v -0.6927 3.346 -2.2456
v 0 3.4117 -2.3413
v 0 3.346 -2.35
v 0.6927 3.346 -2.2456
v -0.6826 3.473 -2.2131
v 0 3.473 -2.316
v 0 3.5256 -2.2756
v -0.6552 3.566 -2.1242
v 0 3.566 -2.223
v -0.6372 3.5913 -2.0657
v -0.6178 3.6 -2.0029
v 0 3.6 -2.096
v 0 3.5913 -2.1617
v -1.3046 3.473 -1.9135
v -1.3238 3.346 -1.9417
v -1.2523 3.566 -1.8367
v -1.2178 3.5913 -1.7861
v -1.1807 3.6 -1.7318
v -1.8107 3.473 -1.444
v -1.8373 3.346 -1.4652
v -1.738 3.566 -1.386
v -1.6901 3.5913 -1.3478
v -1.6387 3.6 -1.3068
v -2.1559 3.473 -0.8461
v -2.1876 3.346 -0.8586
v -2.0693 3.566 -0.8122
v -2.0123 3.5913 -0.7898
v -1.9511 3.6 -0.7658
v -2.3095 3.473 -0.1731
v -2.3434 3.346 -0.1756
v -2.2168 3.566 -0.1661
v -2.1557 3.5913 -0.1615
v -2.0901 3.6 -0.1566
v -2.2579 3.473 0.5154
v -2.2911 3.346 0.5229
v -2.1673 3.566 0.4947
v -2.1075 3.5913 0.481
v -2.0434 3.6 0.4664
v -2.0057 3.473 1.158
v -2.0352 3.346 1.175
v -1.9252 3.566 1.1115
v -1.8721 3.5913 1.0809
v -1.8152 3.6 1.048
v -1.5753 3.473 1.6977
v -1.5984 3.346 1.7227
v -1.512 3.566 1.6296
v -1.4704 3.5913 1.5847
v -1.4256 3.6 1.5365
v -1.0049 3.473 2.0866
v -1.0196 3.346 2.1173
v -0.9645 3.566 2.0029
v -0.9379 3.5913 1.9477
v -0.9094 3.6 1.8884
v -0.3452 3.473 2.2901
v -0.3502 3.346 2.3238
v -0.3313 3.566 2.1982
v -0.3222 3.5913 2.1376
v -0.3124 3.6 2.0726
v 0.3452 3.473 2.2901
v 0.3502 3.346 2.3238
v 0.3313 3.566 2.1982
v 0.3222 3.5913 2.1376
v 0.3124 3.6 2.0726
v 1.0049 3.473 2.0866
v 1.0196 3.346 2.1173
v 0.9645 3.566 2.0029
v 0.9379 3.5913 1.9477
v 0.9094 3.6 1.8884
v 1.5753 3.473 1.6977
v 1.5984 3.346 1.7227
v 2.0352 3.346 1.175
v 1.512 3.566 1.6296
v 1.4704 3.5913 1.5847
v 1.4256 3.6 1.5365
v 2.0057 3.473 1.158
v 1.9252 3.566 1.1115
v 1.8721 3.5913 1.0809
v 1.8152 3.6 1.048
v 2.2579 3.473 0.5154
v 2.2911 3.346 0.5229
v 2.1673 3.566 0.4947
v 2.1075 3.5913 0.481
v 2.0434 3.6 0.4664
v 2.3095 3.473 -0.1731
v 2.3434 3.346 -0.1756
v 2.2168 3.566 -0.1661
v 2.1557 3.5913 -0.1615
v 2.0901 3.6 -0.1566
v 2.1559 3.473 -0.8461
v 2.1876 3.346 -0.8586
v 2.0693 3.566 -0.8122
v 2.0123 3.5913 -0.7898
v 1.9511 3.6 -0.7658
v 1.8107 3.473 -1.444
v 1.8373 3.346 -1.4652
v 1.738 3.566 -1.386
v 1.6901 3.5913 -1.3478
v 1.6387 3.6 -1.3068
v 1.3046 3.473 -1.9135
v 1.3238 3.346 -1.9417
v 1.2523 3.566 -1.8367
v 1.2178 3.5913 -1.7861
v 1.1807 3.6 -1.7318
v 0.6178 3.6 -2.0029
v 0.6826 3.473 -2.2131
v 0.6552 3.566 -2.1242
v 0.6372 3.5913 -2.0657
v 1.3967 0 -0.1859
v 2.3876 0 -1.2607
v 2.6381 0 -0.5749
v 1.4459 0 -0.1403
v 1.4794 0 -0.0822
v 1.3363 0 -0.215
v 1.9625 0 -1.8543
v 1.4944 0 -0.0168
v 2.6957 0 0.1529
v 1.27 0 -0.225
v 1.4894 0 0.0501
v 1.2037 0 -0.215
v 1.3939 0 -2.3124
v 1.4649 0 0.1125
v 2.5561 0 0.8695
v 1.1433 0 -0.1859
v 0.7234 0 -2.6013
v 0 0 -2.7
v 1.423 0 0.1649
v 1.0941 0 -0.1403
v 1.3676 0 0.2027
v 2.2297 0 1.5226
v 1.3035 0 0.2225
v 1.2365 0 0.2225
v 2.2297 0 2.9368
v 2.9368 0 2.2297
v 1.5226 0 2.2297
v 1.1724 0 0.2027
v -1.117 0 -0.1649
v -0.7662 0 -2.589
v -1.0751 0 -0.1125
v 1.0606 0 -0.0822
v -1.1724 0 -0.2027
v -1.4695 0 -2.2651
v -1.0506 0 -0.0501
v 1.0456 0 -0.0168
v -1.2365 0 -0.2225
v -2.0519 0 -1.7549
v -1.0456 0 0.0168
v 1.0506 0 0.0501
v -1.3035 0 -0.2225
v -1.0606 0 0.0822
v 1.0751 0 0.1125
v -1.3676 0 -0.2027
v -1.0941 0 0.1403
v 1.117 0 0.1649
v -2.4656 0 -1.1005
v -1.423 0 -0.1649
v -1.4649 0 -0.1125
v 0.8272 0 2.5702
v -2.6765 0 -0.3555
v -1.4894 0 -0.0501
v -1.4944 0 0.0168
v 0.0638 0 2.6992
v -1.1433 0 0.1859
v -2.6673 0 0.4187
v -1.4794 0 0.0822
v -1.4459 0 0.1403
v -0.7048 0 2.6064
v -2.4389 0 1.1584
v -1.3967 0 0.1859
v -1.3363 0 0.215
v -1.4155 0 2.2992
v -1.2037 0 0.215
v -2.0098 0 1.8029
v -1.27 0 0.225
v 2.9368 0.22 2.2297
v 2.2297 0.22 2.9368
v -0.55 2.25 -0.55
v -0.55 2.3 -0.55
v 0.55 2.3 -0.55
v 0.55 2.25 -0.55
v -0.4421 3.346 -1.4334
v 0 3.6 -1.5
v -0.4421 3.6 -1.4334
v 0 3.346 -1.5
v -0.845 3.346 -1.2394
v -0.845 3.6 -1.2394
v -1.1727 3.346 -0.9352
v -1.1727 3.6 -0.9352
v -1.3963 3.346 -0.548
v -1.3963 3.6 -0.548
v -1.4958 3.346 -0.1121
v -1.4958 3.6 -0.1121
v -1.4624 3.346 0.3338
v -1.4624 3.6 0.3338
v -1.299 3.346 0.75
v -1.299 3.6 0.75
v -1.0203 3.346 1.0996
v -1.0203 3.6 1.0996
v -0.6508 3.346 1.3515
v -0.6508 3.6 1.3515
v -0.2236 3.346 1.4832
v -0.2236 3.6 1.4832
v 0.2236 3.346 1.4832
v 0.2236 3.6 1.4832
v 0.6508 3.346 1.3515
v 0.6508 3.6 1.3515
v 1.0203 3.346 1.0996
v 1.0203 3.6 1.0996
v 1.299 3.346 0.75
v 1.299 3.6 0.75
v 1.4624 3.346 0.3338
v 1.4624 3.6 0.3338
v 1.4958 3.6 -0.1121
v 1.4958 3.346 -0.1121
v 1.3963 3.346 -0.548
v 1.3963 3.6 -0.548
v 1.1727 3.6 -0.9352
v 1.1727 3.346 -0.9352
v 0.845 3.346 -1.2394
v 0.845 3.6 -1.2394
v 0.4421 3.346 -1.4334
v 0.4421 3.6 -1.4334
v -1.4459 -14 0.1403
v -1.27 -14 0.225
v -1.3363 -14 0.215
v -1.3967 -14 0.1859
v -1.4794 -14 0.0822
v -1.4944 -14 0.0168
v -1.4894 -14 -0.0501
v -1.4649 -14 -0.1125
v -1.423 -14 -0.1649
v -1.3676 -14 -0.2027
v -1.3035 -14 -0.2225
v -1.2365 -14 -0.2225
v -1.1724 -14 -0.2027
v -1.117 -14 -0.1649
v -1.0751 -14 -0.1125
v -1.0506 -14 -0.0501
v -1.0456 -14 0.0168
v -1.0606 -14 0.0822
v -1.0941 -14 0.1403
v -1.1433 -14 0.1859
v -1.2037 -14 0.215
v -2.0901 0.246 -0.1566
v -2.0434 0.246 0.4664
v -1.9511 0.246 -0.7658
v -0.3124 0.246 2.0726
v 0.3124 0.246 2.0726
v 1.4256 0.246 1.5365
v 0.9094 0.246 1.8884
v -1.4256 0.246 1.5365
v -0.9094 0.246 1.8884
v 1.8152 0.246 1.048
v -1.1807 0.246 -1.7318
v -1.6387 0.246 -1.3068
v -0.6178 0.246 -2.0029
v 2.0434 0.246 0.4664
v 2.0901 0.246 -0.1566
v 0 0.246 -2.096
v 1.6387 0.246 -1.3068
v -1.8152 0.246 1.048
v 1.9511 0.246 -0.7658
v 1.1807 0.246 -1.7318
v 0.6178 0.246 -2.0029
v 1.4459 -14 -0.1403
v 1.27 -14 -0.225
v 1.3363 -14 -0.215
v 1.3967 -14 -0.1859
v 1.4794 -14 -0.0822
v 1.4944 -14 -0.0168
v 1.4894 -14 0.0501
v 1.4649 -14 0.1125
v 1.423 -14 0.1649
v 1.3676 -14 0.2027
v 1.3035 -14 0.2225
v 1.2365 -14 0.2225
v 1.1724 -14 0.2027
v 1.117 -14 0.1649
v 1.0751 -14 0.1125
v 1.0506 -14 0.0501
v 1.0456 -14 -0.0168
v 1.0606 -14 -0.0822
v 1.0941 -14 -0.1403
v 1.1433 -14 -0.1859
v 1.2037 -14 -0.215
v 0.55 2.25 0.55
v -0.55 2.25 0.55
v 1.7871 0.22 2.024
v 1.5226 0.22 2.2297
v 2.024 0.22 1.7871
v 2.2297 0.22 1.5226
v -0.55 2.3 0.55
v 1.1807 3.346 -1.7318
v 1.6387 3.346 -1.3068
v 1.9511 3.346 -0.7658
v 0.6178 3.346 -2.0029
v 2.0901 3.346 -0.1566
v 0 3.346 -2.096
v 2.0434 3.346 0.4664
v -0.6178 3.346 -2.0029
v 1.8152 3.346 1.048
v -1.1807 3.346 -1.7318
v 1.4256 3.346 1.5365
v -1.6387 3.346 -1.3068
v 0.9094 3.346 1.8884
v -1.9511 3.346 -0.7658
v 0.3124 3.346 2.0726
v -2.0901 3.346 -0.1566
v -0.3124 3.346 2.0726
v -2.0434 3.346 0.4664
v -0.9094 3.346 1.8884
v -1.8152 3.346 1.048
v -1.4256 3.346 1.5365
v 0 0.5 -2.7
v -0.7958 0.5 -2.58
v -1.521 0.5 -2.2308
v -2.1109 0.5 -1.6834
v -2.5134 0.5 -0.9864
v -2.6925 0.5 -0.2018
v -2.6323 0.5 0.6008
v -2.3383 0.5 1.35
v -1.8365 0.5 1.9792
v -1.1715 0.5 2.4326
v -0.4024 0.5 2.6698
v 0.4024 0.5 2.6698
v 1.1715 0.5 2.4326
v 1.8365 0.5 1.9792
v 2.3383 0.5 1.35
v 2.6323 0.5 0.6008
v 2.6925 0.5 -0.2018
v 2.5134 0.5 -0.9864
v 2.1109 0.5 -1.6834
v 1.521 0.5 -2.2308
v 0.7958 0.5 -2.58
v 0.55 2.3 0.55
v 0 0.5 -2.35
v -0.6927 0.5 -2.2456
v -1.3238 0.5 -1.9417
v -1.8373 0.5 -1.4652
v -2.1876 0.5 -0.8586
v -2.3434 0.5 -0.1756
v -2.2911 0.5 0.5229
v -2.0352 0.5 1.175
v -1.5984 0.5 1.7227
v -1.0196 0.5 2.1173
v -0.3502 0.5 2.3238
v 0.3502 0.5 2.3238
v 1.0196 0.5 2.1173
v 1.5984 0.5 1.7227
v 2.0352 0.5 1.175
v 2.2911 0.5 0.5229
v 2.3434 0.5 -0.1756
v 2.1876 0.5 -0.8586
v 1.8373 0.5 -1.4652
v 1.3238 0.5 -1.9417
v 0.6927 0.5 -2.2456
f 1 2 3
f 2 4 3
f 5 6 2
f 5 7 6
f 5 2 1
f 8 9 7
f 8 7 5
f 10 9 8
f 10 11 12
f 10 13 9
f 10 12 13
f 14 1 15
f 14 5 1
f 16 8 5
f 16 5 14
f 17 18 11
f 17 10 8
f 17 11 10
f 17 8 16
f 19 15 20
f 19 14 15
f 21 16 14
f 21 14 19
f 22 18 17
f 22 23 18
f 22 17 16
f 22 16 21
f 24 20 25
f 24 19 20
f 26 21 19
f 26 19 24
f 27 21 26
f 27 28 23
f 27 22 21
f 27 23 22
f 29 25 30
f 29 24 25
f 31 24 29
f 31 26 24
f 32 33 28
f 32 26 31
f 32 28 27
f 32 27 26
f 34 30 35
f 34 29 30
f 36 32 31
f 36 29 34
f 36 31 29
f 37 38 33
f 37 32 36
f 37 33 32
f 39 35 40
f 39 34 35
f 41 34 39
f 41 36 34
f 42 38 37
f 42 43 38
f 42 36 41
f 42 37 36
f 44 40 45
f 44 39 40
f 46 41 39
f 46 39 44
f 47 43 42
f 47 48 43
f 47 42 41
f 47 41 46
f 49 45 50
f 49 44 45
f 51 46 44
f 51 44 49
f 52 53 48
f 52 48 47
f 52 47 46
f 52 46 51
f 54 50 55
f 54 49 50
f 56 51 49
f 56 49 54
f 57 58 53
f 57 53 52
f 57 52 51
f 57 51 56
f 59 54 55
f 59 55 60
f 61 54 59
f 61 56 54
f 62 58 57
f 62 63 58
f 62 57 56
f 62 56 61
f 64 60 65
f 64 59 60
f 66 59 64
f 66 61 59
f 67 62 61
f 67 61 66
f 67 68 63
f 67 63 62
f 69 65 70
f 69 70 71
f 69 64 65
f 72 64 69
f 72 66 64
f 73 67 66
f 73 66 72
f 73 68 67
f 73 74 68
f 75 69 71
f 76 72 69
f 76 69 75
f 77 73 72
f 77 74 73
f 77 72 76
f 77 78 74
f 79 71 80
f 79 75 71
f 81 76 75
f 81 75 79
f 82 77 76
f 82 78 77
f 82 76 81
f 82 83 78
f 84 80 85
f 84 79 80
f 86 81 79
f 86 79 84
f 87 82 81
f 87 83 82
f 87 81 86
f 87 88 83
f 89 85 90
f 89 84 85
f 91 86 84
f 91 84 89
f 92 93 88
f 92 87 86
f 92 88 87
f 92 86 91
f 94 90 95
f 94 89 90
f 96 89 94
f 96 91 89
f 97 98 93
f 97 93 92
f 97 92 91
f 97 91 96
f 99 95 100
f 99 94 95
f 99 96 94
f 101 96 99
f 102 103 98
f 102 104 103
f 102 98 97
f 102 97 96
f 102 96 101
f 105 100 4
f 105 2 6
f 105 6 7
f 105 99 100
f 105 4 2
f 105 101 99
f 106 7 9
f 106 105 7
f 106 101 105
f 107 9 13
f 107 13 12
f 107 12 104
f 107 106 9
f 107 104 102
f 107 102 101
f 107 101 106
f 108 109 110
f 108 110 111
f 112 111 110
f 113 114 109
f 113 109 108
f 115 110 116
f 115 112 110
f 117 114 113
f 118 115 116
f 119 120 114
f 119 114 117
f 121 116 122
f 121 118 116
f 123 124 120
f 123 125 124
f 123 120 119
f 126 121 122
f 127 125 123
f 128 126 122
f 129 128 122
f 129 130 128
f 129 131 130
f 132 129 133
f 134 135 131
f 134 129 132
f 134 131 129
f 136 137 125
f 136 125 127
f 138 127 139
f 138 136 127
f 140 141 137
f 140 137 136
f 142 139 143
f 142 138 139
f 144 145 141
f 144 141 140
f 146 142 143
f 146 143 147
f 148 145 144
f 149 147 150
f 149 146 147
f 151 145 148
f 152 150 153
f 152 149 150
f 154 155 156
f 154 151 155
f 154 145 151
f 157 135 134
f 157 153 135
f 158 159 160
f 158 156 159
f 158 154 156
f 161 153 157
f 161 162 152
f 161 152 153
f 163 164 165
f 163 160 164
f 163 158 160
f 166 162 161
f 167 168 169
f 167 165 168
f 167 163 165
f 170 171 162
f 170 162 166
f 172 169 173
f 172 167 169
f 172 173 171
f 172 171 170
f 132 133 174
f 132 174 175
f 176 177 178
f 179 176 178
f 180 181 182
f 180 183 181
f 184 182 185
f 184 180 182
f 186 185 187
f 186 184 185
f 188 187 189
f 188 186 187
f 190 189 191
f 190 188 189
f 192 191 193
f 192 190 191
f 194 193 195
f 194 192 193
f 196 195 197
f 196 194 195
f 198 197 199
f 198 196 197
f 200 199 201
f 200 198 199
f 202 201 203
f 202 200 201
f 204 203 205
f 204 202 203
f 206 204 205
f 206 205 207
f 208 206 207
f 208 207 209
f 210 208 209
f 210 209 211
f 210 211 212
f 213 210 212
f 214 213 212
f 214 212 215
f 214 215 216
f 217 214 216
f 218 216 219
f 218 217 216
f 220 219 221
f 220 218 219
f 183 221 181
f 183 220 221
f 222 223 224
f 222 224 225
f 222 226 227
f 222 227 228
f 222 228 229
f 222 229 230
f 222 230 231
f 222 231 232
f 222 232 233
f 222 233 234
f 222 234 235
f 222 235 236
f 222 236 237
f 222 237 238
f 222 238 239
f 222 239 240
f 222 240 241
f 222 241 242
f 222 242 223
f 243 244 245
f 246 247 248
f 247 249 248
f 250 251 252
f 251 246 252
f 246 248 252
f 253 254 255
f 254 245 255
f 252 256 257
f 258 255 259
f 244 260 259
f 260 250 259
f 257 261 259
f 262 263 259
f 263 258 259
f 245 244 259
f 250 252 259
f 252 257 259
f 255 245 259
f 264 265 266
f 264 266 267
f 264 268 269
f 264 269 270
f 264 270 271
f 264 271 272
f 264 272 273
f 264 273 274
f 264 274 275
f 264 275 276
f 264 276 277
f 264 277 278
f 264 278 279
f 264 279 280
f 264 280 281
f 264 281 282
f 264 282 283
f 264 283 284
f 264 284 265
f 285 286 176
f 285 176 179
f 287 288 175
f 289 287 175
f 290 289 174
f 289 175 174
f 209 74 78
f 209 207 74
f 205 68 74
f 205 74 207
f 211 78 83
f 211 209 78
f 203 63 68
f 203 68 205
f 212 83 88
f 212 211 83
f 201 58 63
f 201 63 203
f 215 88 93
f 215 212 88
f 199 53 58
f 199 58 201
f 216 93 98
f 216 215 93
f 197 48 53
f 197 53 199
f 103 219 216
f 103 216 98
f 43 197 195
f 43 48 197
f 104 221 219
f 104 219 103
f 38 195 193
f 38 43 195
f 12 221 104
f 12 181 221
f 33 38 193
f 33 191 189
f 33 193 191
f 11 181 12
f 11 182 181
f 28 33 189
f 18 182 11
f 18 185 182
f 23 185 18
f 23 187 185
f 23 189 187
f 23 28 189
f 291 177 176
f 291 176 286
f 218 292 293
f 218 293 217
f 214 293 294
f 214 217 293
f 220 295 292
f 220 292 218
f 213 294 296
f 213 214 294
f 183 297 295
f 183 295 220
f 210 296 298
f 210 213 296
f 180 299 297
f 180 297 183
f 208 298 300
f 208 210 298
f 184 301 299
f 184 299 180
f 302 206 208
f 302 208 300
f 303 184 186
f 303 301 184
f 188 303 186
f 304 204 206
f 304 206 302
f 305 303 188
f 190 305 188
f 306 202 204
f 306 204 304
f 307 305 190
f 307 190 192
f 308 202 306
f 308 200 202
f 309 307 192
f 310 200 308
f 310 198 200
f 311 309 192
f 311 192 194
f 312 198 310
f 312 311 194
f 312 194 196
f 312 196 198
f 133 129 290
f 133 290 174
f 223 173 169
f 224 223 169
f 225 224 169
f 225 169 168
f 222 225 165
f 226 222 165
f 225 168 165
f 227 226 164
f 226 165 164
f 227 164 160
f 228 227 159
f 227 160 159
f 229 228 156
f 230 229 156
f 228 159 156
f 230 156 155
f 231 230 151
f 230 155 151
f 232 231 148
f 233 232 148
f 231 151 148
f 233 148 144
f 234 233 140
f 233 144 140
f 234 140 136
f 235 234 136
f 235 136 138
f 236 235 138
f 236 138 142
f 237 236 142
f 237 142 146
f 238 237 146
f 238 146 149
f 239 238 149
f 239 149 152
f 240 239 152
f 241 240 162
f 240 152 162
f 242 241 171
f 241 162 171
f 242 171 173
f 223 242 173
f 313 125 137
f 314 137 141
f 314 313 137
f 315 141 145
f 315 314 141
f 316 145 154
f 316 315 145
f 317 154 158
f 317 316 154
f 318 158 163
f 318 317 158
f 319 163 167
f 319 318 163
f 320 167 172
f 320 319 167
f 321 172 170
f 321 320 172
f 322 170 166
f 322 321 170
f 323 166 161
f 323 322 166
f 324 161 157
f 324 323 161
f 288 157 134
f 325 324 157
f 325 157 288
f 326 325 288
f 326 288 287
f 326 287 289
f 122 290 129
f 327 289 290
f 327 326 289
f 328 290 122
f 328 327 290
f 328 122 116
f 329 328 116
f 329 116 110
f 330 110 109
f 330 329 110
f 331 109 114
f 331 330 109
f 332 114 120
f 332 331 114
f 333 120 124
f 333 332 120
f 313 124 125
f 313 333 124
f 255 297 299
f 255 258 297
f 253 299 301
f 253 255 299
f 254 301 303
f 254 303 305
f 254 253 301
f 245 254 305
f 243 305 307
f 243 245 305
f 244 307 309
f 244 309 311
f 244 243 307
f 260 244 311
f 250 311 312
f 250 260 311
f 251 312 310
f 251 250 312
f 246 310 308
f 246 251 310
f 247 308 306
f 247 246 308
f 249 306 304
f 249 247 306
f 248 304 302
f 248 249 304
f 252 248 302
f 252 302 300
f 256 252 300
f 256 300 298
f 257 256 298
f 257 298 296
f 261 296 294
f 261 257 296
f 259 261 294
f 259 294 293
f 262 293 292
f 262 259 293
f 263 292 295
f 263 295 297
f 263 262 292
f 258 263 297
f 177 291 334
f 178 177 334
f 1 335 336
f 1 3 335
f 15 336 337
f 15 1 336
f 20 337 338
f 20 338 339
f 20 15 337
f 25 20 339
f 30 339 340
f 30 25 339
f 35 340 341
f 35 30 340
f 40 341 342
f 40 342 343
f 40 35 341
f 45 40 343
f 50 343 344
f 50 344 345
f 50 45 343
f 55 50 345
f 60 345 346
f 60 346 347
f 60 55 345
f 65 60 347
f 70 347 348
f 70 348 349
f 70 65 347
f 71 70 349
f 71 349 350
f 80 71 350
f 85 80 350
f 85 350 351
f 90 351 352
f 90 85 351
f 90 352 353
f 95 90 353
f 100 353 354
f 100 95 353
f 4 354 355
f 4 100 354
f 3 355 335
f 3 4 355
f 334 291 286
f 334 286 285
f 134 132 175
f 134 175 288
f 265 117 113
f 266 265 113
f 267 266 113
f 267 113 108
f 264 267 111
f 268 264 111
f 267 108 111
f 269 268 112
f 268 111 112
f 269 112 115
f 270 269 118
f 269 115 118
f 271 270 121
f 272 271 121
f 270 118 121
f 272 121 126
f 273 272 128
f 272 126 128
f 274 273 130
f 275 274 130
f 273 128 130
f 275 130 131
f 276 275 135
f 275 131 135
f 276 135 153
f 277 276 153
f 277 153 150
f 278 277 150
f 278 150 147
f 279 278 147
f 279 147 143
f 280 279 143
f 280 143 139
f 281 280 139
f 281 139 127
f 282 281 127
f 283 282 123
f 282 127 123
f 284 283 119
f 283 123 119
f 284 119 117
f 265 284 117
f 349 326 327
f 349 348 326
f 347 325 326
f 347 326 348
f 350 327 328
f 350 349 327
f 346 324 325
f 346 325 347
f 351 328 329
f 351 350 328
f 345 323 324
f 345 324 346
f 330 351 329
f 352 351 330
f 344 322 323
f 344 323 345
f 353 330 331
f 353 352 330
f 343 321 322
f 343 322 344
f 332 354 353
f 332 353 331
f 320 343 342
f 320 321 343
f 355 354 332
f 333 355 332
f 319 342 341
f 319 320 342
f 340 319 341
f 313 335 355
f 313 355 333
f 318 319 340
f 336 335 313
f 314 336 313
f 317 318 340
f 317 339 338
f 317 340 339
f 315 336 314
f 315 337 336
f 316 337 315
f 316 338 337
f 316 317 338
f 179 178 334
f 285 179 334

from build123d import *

# Parameters (mm, degrees)
SKETCH2_R           = 2.7
BOSS_EXTRUDE1_DEPTH = 0.246
BOSS_EXTRUDE2_START = -2.3
SKETCH3_W           = 1.1
SKETCH3_H           = 1.1
BOSS_EXTRUDE2_DEPTH = 0.05
BOSS_EXTRUDE7_DEPTH = 0.22
SKETCH5_R           = 0.225
BOSS_EXTRUDE8_DEPTH = 14


with BuildPart() as part:
    # Sketch1 → Revolve-Thin2 (revolve)
    with BuildSketch(Plane.XY, mode=Mode.PRIVATE) as revolve_thin2_sk:
        with BuildLine():
            Line((2.7, 0), (2.7, 0.5))
            Line((2.7, 0.5), (2.35, 0.5))
            Line((2.35, 0.5), (2.35, 3.346))
            ThreePointArc((2.35, 3.346), (2.275605122, 3.525605122), (2.096, 3.6))
            Line((2.096, 3.6), (1.5, 3.6))
            Line((1.5, 3.6), (1.5, 3.346))
            Line((1.5, 3.346), (2.096, 3.346))
            Line((2.096, 3.346), (2.096, 0.246))
            Line((2.096, 0.246), (2.446, 0.246))
            Line((2.446, 0.246), (2.446, 0))
            Line((2.446, 0), (2.7, 0))
        make_face()
    revolve(revolve_thin2_sk.sketch.rotate(Axis((0, 0, 0), (0, 1, 0)), 90), axis=Axis((0, 0, 0), (0, 1, 0)))  # turned: the seam where the file's is

    # Sketch2 → Boss-Extrude1 (add)
    with BuildSketch(Plane.XZ):
        with Locations(Location((0, 0, 0), (0, 0, 270))):  # turned: the seam where the file's is
            Circle(SKETCH2_R)
    extrude(amount=-BOSS_EXTRUDE1_DEPTH)

    # Sketch10 → Boss-Extrude7 (add)
    with BuildSketch(Plane.XZ):
        Polygon((1.522612913, 2.229719695), (2.229719695, 1.522612913), (2.936826476, 2.229719695), (2.229719695, 2.936826476), align=None)
    extrude(amount=-BOSS_EXTRUDE7_DEPTH)

    # Sketch5 → Boss-Extrude8 (add)
    with BuildSketch(Plane.XZ):
        with Locations(Location((1.27, 0, 0), (0, 0, 270))):  # turned: the seam where the file's is
            Circle(SKETCH5_R)
        with Locations(Location((-1.27, 0, 0), (0, 0, 90))):  # turned: the seam where the file's is
            Circle(SKETCH5_R)
    extrude(amount=BOSS_EXTRUDE8_DEPTH)


with BuildPart() as body_2:
    # Sketch3 → Boss-Extrude2 (new body)
    with BuildSketch(Plane.XZ.offset(BOSS_EXTRUDE2_START)):
        Rectangle(SKETCH3_W, SKETCH3_H)
    extrude(amount=BOSS_EXTRUDE2_DEPTH)


solid = Compound([part.part, body_2.part])
